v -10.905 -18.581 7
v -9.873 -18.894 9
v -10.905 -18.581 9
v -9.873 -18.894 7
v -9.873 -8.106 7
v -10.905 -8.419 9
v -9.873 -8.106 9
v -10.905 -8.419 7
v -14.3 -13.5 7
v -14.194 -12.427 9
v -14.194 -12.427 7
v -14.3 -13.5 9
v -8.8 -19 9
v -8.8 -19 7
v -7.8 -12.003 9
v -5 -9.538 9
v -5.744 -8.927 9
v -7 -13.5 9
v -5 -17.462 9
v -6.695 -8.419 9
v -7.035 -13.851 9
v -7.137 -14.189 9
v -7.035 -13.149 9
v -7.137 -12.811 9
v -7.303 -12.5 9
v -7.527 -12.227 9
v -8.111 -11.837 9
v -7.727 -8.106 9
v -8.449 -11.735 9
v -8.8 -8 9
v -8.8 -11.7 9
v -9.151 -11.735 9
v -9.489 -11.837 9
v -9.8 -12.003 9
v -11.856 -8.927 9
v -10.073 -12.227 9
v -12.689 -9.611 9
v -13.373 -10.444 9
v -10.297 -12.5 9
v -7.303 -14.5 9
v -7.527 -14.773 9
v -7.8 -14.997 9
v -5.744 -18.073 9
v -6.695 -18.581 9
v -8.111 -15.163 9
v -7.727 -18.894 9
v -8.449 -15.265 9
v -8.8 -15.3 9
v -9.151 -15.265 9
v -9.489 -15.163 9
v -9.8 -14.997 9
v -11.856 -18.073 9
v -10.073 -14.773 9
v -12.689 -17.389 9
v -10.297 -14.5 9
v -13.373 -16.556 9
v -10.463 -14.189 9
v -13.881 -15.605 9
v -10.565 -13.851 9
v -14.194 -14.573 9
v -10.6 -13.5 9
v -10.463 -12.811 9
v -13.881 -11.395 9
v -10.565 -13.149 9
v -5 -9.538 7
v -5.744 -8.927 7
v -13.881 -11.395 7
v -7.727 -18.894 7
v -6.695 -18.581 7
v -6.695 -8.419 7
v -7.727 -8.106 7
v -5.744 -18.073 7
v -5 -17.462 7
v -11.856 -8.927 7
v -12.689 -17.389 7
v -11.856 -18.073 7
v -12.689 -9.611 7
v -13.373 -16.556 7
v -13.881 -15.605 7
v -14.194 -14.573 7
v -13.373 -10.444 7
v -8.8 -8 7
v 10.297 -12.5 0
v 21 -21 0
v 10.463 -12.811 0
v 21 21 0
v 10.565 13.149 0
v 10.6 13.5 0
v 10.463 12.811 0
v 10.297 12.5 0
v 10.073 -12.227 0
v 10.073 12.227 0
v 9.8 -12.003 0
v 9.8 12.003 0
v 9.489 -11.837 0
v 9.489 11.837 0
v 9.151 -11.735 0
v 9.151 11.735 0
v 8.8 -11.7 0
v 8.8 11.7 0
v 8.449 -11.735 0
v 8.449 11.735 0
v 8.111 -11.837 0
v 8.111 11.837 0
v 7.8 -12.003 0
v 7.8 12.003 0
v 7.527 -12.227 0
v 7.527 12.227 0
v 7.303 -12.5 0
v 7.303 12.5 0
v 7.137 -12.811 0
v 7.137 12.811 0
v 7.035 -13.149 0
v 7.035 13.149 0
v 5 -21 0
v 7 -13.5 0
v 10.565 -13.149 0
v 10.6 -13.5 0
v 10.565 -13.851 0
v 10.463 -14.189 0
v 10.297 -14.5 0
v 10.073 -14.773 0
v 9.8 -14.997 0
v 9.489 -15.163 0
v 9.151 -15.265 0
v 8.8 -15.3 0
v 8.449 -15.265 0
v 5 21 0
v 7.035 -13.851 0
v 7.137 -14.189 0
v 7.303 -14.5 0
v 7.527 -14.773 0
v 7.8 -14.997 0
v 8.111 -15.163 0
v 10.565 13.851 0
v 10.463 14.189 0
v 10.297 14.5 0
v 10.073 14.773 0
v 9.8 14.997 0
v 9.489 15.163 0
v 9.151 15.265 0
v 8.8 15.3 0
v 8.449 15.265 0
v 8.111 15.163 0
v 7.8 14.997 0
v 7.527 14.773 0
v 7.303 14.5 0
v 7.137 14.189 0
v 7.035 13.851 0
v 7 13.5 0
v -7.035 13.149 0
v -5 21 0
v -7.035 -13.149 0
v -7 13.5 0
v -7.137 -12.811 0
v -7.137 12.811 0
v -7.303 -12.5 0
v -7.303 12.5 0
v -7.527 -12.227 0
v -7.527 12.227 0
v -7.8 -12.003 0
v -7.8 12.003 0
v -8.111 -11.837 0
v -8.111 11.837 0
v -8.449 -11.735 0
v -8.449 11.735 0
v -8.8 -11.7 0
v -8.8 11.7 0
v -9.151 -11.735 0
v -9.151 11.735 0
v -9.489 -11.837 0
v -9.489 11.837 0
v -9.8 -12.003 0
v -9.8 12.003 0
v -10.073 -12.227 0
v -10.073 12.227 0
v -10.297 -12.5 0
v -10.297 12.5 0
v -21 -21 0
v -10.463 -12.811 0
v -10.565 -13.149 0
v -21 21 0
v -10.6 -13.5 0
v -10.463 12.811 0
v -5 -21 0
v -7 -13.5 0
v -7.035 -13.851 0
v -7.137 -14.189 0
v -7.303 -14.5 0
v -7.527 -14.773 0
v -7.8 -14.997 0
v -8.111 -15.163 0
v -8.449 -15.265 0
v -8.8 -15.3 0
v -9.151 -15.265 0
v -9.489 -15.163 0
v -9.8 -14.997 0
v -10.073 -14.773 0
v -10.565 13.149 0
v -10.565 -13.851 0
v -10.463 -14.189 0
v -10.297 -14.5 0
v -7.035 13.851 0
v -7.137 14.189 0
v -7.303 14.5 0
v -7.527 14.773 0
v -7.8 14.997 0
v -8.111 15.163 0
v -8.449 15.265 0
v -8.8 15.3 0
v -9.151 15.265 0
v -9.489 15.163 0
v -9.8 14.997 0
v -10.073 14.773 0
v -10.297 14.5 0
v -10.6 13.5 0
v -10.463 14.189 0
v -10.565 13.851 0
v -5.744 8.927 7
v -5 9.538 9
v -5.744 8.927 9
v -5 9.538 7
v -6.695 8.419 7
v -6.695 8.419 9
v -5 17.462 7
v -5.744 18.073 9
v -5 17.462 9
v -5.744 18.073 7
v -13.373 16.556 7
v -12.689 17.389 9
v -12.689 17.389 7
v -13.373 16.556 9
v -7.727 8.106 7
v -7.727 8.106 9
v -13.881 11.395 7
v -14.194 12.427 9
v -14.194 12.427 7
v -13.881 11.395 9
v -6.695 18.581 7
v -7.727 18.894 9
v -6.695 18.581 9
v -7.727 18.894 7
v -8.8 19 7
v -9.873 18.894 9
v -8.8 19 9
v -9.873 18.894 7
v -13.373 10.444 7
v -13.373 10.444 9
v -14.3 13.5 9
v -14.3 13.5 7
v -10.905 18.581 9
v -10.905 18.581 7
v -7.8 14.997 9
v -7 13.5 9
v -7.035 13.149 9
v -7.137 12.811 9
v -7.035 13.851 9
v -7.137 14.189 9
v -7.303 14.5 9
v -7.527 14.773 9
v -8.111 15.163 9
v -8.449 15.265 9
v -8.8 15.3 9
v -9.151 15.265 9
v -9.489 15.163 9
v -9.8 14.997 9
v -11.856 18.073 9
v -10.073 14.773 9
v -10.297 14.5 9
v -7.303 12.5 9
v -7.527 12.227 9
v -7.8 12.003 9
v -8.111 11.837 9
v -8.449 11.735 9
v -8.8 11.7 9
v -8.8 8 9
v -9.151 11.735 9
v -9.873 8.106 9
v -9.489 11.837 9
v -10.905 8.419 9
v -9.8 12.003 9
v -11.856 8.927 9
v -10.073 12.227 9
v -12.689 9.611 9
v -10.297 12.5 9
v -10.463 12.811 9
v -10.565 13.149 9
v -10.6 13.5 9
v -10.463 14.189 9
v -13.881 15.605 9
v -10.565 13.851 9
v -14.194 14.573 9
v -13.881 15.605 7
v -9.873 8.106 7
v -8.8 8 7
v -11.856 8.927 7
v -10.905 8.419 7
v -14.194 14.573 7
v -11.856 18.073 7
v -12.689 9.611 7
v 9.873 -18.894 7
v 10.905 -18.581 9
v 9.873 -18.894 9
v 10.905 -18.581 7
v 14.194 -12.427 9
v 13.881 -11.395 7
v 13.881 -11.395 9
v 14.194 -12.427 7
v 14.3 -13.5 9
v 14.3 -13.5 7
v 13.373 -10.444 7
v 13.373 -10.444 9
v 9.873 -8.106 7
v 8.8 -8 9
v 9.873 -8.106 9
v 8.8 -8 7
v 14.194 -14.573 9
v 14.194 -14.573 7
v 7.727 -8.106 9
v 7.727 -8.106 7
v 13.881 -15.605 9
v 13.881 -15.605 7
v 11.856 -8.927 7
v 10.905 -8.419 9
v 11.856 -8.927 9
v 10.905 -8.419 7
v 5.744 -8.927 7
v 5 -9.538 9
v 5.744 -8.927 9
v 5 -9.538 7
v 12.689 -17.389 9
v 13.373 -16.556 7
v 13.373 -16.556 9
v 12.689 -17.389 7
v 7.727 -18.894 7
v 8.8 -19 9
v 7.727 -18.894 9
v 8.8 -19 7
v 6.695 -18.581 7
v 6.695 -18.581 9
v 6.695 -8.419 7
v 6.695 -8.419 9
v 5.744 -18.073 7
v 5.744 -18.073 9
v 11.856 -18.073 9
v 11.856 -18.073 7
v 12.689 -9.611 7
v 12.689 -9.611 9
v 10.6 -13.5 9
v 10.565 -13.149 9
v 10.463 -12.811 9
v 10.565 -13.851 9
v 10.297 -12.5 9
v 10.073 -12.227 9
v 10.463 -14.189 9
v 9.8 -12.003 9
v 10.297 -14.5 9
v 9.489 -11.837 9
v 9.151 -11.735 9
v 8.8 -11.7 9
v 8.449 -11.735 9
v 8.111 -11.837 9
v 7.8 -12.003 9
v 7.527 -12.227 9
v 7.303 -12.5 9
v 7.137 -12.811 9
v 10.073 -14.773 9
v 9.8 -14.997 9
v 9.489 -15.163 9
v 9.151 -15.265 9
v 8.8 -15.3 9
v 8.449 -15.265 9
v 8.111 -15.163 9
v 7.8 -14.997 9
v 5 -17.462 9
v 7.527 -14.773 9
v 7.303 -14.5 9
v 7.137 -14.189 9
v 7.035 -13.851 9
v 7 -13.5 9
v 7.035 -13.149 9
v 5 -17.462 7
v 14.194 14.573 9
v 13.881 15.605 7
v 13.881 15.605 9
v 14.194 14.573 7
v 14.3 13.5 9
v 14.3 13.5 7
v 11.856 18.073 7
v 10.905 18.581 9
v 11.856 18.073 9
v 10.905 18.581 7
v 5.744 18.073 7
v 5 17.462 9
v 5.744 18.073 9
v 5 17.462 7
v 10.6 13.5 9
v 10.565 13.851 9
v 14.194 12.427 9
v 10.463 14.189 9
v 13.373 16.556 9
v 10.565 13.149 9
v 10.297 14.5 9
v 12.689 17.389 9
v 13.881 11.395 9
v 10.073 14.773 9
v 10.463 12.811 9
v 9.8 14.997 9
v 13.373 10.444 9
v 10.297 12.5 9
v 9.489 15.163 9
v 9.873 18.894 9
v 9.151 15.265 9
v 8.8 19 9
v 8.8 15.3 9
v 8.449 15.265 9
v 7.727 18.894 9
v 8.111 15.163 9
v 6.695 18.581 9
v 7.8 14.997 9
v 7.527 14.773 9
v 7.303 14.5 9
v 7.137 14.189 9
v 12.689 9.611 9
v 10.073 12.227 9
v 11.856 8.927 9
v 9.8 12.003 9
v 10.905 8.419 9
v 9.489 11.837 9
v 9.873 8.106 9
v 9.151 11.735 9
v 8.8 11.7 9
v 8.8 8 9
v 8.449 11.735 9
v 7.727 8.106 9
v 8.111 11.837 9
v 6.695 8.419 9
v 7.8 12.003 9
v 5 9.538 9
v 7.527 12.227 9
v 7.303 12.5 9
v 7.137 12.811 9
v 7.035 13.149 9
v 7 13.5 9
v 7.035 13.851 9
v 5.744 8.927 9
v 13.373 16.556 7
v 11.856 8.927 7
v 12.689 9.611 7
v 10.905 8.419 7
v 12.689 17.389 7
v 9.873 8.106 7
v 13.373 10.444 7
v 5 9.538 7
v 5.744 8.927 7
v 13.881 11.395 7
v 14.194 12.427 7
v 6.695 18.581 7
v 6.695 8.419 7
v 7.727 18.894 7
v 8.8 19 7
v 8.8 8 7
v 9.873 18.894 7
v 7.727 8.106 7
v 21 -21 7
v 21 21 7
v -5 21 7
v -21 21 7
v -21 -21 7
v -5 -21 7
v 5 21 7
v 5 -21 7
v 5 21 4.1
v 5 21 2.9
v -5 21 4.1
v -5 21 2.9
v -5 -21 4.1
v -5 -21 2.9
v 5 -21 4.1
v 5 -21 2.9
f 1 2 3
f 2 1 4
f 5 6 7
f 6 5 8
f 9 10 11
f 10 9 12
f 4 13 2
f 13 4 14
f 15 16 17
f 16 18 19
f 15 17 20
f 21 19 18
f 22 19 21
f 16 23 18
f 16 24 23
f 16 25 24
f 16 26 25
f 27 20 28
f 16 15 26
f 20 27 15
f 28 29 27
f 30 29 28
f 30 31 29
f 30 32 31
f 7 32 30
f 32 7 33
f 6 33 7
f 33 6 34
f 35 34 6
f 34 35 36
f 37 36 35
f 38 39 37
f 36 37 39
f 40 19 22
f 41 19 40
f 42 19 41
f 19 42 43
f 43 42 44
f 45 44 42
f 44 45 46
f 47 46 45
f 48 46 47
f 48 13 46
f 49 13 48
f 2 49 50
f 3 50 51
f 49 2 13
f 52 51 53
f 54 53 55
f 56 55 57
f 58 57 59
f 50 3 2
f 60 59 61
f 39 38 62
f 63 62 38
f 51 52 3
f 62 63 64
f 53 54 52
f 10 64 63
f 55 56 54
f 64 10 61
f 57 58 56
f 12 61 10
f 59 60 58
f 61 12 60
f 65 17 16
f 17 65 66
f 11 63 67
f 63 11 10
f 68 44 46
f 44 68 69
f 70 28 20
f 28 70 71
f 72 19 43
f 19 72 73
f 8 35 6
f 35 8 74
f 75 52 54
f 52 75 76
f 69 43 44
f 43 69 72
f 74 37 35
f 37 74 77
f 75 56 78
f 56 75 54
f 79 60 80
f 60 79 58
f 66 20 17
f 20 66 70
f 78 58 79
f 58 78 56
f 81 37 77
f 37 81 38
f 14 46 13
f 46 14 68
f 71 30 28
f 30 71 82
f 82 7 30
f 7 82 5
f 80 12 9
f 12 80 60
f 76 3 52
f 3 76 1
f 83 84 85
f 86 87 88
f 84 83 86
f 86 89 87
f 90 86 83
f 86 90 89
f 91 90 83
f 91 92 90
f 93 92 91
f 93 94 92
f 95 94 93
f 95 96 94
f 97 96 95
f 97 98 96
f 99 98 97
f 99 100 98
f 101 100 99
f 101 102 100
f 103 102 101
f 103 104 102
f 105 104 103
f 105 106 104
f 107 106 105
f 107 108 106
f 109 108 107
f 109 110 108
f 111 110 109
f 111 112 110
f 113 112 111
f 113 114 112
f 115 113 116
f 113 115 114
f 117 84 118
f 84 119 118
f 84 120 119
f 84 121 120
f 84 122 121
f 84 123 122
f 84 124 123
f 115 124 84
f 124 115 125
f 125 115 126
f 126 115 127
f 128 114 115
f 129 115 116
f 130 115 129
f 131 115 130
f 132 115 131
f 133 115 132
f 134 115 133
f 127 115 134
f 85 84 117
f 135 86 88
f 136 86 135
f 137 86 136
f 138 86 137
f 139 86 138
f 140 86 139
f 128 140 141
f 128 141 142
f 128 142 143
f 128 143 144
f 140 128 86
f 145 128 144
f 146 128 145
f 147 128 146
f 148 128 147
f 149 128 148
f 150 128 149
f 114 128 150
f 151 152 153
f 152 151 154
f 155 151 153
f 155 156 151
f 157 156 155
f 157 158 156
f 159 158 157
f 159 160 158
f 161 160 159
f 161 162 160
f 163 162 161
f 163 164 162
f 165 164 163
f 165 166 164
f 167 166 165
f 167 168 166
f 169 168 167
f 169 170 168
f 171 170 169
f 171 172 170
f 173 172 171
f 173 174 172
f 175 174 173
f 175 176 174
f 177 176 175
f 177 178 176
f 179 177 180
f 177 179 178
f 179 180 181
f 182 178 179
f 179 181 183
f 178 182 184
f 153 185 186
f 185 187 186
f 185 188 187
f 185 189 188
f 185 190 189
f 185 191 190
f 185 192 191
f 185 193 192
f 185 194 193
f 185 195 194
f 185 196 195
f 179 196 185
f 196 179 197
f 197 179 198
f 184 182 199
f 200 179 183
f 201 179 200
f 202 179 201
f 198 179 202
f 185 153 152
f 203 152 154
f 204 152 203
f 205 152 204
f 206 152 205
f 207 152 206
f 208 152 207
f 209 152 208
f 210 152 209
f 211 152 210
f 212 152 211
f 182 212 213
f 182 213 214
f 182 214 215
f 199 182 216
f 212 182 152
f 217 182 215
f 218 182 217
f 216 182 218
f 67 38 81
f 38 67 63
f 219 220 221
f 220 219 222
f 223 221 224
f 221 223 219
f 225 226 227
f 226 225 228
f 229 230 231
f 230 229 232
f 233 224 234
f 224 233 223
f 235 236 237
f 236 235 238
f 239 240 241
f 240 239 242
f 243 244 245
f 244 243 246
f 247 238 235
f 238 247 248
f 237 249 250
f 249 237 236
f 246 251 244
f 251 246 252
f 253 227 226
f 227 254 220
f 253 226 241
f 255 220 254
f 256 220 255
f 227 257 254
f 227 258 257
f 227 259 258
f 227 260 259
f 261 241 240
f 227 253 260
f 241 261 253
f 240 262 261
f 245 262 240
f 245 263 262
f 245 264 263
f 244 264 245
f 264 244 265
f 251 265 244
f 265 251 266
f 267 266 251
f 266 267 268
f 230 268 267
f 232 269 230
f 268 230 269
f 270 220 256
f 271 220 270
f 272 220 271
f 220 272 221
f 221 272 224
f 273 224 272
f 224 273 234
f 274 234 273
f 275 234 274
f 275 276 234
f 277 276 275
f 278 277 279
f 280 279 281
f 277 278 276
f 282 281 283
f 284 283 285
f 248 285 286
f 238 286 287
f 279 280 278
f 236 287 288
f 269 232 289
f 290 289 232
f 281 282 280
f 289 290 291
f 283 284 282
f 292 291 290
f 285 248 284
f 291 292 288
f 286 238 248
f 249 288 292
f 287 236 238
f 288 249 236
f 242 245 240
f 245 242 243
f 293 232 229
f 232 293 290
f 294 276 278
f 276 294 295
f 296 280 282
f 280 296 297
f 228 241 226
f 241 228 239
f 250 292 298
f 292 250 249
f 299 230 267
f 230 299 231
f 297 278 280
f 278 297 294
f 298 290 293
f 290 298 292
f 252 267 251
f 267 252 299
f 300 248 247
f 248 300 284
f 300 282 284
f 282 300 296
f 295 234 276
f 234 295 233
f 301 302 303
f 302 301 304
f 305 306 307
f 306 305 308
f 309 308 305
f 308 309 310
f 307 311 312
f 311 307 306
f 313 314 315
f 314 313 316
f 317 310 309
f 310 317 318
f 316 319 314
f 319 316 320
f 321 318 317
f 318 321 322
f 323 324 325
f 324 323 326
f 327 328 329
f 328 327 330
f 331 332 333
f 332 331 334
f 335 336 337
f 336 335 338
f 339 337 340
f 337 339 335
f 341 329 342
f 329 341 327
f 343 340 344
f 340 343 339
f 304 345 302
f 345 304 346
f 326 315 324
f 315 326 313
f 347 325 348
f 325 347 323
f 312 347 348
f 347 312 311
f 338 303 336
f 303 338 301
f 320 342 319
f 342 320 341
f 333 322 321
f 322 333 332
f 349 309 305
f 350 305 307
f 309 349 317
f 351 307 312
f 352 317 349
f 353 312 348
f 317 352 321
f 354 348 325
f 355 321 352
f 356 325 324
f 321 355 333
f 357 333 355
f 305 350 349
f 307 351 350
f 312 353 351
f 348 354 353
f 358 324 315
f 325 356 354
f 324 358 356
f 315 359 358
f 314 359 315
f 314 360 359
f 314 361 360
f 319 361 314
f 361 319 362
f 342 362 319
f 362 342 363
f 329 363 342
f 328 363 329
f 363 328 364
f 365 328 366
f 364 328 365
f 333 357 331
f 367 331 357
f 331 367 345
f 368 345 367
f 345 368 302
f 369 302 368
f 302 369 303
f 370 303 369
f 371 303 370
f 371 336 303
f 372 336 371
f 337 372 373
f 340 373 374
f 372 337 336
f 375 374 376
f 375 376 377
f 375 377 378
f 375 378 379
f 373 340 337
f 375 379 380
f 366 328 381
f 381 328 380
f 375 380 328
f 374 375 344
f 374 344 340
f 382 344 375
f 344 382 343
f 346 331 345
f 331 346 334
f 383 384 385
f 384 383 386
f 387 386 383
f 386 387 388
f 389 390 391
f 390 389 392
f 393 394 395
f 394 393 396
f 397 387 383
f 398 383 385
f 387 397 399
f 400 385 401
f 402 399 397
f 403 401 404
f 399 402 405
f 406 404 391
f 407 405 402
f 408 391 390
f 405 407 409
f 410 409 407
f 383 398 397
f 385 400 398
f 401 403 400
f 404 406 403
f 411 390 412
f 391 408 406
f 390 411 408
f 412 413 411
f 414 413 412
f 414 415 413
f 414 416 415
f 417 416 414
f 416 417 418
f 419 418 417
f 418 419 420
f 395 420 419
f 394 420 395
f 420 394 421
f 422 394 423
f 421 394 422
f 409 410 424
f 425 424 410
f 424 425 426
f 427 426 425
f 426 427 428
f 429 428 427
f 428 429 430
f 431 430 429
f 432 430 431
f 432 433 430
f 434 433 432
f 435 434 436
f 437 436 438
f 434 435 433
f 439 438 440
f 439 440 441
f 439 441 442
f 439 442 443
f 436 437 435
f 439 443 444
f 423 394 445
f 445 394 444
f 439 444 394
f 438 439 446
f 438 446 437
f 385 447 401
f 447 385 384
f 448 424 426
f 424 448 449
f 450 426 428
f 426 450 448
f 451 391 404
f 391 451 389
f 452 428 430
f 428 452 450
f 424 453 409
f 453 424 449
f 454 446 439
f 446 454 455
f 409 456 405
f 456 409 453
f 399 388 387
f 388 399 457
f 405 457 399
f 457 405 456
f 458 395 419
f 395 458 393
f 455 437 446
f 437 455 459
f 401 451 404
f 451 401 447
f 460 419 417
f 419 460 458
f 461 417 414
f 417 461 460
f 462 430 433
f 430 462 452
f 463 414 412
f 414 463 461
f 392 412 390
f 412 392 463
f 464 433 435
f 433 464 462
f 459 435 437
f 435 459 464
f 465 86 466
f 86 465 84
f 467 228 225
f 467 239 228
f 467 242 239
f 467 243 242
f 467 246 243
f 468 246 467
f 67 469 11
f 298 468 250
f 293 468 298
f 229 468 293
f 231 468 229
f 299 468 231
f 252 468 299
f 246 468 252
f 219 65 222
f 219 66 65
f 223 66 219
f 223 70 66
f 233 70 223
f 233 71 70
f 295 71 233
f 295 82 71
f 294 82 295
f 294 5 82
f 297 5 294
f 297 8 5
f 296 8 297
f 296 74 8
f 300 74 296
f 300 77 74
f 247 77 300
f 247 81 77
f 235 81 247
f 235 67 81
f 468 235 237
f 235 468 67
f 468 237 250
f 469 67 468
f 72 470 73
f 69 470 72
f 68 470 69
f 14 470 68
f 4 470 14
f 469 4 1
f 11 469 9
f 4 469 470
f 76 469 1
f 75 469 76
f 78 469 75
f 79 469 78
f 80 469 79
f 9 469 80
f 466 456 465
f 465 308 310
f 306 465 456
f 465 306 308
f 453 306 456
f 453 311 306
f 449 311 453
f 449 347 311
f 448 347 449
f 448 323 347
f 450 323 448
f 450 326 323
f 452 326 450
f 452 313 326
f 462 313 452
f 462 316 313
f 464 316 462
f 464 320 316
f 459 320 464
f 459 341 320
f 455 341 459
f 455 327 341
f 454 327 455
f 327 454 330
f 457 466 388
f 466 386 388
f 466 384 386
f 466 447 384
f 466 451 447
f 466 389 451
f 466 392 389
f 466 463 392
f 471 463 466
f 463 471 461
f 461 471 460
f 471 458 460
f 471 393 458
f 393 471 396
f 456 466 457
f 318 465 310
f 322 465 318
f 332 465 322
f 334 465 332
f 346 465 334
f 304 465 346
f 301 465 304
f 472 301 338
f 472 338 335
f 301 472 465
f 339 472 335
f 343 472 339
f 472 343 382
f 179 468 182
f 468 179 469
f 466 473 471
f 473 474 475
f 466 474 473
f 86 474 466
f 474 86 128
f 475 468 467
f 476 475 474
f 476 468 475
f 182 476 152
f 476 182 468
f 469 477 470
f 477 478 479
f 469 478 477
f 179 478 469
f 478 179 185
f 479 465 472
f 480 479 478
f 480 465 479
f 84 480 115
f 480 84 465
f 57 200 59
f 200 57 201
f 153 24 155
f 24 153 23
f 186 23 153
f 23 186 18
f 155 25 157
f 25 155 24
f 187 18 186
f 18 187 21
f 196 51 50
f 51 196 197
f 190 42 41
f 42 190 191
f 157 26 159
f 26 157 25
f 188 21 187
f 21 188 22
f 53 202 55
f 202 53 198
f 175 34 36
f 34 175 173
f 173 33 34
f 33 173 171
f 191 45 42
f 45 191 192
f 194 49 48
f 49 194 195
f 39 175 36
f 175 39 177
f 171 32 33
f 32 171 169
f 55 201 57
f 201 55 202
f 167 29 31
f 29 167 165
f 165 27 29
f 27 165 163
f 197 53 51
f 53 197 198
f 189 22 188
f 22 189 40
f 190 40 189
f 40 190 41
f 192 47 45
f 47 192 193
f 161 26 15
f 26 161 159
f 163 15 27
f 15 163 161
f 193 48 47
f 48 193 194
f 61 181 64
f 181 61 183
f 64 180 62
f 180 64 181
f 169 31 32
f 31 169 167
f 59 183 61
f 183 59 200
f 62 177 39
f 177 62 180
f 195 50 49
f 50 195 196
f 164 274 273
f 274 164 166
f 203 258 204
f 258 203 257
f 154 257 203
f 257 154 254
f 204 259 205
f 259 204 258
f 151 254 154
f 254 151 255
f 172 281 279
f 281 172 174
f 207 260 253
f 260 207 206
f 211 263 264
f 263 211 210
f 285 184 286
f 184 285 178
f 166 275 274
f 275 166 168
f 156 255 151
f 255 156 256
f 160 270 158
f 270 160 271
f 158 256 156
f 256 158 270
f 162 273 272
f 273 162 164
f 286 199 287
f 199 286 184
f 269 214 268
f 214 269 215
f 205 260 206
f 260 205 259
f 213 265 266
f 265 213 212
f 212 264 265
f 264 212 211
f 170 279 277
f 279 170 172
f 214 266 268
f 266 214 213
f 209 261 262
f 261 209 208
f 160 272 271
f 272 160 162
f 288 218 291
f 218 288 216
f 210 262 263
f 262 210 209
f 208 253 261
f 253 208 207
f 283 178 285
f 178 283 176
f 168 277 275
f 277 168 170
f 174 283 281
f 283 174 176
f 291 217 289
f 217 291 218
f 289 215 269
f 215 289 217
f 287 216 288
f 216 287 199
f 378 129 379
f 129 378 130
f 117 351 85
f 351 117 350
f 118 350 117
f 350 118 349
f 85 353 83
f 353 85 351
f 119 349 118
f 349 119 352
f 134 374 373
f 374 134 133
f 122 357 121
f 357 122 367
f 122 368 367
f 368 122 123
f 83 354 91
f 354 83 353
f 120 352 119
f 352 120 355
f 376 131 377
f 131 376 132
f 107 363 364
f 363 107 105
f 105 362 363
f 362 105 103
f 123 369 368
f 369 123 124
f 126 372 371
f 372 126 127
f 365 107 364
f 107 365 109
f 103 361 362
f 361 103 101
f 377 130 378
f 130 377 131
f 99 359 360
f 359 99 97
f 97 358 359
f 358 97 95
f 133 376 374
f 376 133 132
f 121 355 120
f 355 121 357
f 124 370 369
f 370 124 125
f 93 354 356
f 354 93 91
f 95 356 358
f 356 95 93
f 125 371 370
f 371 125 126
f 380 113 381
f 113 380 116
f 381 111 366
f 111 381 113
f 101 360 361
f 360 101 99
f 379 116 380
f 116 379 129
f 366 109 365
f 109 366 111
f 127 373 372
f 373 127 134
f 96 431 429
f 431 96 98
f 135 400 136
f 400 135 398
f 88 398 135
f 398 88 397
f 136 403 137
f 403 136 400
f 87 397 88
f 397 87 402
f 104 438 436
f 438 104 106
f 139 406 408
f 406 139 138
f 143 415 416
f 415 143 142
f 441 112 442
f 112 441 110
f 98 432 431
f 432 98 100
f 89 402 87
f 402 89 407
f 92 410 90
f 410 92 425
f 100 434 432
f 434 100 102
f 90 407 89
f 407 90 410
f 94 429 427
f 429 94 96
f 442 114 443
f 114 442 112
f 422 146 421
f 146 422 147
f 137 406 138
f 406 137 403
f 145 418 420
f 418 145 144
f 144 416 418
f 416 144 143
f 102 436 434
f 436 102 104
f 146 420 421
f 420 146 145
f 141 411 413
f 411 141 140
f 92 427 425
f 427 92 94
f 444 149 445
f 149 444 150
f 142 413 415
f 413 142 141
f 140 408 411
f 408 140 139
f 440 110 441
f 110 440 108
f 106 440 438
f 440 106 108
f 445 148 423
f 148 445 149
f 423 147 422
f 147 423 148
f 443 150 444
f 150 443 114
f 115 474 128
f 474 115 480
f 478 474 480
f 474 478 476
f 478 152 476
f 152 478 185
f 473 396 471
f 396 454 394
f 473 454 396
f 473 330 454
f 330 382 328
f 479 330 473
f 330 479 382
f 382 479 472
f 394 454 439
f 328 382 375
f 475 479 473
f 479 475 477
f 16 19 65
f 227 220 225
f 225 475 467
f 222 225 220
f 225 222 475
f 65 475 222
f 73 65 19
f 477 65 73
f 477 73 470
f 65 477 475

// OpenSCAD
$fn = 32;

// ----------------------------------------------------------------------
// Living hinge: 42 x 42 mm plates, 1.2 mm flexible web
// ----------------------------------------------------------------------

// --- parameters (mm) ---
plate_len = 16;           // plate length outside the web
plate_w = 42;             // plate width
thick = 7;                // plate thickness
web_half = 5;             // half width of the flex band
web_t = 1.2;              // flexible web thickness
web_z = 2.9;              // web position inside the thickness
boss_d = 11;              // screw boss diameter
boss_h = 9;               // screw boss height
boss_x = 8.8;             // screw boss distance from the web
screw_d = 3.6;            // screw hole

difference() {
  union() {
    /* one flat strip, later thinned at the middle */
    translate([-21, -21, 0]) cube([42, 42, 7]);
    /* screw bosses, sunk 0.5 mm into the plates */
    for (sx = [-8.8, 8.8]) {
      for (sy = [-13.5, 13.5]) {
        translate([sx, sy, 0]) cylinder(h = boss_h, d = boss_d);
      }
    }
  }
  /* channel from below: leaves the web on top of it */
  translate([-5, -23.5, -2.5]) cube([10, 47, 5.4]);
  /* channel from above: thins the web down to web_t */
  translate([-5, -23.5, 4.1]) cube([10, 47, 5.4]);
  /* screw holes through the bosses */
  for (sx = [-8.8, 8.8]) {
    for (sy = [-13.5, 13.5]) {
      translate([sx, sy, -2.5]) cylinder(h = boss_h + 5, d = screw_d);
    }
  }
}
